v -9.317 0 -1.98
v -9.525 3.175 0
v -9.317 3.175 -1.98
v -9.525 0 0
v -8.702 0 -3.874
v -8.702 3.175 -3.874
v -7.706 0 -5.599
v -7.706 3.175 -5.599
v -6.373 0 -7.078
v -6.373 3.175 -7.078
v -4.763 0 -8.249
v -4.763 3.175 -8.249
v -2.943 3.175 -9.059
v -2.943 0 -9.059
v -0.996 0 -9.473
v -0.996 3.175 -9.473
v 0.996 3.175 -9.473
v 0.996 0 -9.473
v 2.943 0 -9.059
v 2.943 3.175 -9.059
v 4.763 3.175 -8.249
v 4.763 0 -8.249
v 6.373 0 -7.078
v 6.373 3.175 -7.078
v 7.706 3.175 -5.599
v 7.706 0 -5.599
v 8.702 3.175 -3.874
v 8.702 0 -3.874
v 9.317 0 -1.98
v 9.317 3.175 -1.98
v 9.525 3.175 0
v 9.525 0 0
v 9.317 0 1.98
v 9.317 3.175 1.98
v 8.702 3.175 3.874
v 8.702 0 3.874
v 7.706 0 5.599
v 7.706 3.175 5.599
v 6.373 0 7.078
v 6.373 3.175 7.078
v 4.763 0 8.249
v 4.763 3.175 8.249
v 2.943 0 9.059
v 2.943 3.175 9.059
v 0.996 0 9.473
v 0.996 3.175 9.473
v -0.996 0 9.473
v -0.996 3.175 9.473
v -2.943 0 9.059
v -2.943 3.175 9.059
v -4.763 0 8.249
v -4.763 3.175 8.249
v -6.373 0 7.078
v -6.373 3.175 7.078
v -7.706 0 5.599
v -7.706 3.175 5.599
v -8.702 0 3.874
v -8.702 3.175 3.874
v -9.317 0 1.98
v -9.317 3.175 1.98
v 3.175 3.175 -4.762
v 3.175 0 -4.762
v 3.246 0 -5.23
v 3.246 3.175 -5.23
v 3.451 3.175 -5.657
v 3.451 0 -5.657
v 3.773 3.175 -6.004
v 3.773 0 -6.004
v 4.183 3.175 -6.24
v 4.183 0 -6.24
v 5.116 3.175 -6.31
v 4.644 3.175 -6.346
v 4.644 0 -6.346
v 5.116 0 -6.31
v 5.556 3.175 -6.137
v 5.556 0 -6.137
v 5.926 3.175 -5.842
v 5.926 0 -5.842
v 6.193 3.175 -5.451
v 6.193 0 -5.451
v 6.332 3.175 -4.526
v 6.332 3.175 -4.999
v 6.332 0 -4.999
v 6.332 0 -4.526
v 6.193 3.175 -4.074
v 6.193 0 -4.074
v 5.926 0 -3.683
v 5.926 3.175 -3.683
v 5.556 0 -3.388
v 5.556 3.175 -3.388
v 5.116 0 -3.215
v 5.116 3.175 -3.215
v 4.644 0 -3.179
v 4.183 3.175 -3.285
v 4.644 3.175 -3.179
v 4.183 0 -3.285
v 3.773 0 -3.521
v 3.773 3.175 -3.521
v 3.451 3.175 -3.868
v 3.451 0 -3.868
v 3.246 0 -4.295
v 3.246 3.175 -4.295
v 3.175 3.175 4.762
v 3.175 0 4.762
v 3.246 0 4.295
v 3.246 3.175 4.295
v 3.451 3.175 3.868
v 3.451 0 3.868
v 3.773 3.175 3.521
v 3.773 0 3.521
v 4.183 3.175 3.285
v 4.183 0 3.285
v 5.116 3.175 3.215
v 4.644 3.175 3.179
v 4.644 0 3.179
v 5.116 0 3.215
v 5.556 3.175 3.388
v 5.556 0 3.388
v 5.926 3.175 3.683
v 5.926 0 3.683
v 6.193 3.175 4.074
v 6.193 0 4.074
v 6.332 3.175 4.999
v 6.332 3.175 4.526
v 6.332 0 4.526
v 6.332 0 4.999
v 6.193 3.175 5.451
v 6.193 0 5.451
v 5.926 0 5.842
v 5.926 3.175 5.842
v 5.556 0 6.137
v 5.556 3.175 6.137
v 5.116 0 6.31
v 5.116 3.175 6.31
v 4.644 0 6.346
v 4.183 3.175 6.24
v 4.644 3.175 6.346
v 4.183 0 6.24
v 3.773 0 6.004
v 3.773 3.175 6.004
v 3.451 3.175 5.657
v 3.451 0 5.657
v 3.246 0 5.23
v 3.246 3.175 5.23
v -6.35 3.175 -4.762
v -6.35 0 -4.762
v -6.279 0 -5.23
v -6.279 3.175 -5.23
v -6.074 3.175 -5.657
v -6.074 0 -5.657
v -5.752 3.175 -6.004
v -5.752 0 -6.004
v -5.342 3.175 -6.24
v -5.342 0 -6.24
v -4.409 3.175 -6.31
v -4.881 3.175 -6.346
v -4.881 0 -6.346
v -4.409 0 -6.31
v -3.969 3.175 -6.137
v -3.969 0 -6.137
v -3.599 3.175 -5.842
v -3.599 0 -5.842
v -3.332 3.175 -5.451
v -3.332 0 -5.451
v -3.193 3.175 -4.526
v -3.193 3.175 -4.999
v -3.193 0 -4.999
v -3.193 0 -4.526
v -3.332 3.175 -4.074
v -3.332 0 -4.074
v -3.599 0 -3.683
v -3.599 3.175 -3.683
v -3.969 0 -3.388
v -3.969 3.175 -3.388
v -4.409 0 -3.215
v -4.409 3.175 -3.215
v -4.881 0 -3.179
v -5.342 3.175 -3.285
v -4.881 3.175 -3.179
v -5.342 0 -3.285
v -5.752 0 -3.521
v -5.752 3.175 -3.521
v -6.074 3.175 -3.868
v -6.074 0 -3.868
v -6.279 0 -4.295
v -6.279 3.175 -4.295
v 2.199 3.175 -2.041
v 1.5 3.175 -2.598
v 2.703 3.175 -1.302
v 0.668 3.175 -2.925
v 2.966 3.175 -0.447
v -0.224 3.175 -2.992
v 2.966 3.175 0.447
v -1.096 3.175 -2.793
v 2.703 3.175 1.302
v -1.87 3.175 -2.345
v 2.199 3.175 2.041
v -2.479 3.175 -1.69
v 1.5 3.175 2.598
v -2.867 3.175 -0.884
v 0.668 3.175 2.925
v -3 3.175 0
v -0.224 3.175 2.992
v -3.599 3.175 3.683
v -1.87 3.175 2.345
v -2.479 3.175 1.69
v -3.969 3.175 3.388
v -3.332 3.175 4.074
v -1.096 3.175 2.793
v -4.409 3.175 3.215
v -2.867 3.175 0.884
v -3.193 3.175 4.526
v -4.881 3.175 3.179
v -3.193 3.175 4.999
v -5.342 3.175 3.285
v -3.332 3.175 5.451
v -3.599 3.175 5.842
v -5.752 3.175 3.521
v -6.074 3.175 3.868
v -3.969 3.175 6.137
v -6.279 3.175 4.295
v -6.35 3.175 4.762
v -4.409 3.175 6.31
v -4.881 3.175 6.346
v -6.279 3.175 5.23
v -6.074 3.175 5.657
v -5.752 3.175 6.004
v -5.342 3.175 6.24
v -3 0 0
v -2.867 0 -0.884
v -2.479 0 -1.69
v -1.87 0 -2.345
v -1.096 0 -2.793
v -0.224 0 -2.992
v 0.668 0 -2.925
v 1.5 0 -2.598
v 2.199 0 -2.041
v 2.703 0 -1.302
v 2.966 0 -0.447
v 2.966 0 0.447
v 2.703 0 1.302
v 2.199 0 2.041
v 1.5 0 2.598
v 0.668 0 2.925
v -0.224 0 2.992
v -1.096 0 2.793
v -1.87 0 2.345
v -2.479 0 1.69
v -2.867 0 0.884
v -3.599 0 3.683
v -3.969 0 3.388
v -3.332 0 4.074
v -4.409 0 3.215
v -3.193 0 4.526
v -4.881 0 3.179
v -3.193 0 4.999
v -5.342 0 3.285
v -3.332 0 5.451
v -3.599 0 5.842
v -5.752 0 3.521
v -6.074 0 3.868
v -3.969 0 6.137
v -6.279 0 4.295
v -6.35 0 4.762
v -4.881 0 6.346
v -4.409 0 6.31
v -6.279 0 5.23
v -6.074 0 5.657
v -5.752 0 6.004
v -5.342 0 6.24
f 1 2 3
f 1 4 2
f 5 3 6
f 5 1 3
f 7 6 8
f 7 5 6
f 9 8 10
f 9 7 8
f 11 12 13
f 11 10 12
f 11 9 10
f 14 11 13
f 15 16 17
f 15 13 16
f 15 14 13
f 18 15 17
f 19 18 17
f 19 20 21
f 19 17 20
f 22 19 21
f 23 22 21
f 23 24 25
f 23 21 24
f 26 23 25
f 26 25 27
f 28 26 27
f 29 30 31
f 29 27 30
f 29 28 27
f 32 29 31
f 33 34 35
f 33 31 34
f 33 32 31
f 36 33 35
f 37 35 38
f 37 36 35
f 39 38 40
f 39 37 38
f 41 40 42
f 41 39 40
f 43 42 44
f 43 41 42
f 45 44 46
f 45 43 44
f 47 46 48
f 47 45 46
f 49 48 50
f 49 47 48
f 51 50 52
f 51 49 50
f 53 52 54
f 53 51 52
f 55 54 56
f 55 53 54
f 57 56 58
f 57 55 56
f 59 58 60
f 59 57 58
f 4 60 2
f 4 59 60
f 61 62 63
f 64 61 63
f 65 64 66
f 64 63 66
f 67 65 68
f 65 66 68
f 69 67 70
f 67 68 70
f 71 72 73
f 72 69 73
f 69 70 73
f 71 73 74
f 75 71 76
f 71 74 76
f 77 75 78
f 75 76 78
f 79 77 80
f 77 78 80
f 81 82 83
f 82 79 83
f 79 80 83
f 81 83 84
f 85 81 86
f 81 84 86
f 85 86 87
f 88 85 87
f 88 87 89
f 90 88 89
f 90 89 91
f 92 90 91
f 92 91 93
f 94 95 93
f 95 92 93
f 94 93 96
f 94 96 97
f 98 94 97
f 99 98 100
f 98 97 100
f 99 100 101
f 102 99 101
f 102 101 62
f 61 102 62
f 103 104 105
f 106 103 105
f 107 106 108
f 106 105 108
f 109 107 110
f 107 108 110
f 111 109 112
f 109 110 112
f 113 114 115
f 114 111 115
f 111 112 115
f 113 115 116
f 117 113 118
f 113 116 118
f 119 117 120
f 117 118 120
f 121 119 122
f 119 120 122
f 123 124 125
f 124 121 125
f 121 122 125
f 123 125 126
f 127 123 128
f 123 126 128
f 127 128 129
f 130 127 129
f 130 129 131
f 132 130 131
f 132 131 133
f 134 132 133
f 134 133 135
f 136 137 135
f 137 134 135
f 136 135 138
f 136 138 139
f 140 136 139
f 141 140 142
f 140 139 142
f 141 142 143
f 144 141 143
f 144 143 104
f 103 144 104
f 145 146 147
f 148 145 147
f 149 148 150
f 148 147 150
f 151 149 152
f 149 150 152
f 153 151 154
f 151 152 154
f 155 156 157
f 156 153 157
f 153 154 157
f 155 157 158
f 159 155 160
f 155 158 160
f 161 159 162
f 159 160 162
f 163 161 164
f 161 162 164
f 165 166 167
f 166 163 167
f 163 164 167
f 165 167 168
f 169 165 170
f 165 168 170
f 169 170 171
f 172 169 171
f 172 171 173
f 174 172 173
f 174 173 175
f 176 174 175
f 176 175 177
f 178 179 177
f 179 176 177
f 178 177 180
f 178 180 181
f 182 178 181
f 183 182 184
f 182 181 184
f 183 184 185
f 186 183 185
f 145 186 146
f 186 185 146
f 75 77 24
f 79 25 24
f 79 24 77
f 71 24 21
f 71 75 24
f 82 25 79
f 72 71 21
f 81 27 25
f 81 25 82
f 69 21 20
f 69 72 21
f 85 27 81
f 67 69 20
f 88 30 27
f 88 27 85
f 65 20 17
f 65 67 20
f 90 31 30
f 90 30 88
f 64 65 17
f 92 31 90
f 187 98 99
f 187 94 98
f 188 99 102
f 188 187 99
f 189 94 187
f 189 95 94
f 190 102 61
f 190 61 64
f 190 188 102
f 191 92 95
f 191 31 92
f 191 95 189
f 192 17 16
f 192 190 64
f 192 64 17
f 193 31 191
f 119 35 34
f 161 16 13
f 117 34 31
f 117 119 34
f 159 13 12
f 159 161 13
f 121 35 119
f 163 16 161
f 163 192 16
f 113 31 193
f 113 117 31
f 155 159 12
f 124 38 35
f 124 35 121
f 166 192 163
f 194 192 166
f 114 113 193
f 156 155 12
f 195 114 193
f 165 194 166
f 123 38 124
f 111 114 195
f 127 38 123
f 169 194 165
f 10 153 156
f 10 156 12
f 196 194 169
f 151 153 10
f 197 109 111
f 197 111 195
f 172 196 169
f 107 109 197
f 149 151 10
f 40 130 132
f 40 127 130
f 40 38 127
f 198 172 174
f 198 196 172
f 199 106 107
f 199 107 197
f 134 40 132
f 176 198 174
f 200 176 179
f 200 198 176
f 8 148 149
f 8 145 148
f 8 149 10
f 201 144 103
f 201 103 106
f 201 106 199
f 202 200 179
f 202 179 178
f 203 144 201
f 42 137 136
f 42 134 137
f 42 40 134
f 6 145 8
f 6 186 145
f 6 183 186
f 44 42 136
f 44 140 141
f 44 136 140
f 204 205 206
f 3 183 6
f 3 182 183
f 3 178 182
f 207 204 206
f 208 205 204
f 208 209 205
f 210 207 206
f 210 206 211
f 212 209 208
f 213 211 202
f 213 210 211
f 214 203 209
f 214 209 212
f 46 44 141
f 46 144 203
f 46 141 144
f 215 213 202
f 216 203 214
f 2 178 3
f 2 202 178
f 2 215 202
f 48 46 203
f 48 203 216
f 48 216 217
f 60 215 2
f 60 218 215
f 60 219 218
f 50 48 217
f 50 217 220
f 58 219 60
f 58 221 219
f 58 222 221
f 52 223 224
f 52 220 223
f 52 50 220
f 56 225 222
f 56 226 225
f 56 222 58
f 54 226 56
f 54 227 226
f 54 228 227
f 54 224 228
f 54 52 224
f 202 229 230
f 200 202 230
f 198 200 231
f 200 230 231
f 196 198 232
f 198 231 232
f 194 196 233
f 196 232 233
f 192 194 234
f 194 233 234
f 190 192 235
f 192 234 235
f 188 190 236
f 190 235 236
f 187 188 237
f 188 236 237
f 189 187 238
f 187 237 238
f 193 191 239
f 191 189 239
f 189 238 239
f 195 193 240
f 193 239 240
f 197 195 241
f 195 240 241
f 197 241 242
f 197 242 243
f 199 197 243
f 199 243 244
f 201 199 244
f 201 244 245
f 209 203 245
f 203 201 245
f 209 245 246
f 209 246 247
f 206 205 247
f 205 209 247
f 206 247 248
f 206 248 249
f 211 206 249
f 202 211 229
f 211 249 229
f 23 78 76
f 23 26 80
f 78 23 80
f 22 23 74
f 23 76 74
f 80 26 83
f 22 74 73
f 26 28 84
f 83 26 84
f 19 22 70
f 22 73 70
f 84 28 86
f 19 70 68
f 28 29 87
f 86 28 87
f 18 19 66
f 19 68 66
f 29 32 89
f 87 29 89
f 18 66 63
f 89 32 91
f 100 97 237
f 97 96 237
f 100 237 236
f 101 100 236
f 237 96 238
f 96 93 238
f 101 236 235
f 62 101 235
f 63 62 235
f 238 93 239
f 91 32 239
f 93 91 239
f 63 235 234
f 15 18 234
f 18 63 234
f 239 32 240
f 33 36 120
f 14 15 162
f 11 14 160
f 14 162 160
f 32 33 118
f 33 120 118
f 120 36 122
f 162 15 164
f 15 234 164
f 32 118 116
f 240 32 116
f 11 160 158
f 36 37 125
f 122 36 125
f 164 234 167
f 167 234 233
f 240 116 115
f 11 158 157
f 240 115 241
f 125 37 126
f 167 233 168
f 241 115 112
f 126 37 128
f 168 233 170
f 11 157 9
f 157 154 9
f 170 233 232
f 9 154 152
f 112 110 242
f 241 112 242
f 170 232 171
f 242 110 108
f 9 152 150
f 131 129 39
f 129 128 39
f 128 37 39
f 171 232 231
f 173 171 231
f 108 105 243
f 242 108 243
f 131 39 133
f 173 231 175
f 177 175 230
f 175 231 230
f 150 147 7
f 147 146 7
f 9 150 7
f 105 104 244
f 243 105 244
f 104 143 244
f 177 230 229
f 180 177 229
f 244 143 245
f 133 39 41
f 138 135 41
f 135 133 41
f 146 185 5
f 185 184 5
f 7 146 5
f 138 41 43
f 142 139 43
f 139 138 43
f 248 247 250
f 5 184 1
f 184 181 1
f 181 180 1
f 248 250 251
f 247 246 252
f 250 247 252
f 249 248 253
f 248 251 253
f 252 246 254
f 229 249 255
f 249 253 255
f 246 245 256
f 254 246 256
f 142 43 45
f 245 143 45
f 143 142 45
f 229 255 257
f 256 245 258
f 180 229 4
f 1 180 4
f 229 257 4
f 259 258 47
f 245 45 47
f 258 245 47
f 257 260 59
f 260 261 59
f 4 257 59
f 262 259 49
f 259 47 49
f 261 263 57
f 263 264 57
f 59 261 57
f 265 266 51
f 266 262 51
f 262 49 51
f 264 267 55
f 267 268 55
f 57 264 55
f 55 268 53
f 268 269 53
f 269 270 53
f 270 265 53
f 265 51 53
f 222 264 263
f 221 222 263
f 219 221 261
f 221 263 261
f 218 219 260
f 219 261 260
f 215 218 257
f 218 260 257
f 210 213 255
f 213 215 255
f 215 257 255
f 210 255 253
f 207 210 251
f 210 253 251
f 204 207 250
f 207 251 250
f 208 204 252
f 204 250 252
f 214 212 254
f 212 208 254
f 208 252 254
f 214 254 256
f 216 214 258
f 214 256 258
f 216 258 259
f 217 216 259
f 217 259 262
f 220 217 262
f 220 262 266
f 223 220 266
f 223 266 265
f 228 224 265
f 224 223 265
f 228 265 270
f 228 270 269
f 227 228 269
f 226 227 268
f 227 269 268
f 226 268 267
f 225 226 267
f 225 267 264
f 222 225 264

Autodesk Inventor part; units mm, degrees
ref_plane "YZ Plane" through (0, 0, 0) normal (1, 0, 0) x (0, 1, 0)
ref_plane "XZ Plane" through (0, 0, 0) normal (0, 1, 0) x (-1, 0, 0)
ref_plane "XY Plane" through (0, 0, 0) normal (0, 0, 1) x (1, 0, 0)
sketch "Sketch1" plane through (0, 0, 0) normal (0, 1, 0) x (-1, 0, 0)
  circle A0 centre (0, 0) radius 9.525
  circle A1 centre (0, 0) radius 3
  circle A2 centre (4.7625, 4.7625) radius 1.5875
  circle A3 centre (-4.7625, 4.7625) radius 1.5875
  circle A4 centre (-4.7625, -4.7625) radius 1.5875
  circle A5 centre (4.7625, -4.7625) radius 1.5875
  dimension "d0" = 19.05
  dimension "d1" = 3.175
  dimension "d4" = 360
  dimension "d6" = 6
extrude "Extrusion1" add sketch "Sketch1" along normal blind 3.175
properties part number "Flip up and down (motor to shaft ring)"
